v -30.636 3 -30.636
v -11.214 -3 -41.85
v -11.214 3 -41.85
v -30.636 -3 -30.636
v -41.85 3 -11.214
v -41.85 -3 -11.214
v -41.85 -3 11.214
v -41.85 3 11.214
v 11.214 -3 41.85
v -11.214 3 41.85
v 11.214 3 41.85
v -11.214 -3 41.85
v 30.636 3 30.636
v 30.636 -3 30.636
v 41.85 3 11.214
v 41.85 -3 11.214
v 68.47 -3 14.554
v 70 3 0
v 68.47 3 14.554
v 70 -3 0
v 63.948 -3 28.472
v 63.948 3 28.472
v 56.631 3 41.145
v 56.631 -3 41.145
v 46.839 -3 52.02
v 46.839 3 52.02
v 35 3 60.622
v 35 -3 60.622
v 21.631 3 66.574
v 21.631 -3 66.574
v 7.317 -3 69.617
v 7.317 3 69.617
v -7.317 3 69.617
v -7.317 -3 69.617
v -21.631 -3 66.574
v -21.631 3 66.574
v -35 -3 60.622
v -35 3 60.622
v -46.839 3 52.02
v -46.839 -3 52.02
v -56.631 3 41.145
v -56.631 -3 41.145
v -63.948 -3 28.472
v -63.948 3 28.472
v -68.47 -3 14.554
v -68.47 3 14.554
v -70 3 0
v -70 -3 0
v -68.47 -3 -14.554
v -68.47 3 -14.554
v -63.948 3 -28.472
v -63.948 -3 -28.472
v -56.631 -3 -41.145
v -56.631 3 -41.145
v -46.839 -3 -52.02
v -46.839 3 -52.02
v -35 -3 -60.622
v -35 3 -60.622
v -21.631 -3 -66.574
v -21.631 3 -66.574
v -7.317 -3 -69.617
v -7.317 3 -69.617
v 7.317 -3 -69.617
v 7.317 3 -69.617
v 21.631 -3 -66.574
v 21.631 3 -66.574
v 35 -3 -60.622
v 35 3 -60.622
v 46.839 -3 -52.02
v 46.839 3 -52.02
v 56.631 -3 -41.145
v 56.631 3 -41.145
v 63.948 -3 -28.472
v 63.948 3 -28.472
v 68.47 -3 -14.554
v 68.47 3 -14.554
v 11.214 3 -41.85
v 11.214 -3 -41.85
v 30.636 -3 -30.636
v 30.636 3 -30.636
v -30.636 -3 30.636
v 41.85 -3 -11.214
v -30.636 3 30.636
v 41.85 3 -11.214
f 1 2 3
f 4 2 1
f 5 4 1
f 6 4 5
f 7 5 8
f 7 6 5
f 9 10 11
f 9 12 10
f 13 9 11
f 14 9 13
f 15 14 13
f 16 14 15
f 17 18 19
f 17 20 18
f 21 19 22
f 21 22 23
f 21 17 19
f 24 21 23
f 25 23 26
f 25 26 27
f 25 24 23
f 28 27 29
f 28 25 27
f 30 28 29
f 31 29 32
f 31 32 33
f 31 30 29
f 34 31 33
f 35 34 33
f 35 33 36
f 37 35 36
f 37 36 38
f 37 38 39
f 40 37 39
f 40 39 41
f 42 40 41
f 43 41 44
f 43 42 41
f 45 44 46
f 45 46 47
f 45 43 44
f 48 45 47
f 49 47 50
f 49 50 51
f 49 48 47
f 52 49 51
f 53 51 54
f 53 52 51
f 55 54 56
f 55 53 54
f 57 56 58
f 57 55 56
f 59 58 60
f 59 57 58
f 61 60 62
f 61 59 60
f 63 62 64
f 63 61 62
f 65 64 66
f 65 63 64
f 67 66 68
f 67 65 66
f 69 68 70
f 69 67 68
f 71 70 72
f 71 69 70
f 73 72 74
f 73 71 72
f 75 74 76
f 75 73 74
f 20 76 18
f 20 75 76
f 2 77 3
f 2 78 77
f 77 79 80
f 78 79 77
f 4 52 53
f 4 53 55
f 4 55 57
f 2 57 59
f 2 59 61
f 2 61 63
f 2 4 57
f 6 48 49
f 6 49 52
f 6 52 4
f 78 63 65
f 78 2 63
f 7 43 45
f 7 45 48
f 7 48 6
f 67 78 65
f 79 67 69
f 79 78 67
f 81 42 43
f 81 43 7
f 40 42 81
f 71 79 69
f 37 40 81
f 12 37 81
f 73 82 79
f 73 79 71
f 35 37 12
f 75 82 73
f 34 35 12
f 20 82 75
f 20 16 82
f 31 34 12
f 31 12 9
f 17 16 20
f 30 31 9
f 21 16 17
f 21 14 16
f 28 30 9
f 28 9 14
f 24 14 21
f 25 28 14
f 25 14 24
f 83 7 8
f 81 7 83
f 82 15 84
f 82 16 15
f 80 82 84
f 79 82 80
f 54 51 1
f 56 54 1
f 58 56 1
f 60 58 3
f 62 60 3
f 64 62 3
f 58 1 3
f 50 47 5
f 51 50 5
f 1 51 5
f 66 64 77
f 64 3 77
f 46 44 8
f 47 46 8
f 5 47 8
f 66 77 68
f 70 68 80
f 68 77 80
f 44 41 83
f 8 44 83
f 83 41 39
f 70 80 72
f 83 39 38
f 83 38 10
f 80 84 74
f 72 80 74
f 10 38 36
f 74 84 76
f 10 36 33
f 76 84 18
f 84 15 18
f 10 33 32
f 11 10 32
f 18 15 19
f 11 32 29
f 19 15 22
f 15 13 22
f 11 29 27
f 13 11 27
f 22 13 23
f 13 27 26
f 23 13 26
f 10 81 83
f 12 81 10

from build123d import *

# Parameters (mm, degrees)
F0_R     = 70
F1_DEPTH = 3


# Not quite as in the source:
# - a feature of the source that left no trace in its solid (it failed there, or was rolled back) is left out


with BuildPart() as f1:
    # F0 (on Front) → F1 (new body, symmetric)
    with BuildSketch(Plane.XZ):
        Circle(F0_R)
        Polygon((-30.6363262968, 30.6363262968), (-11.2136737032, 41.85), (11.2136737032, 41.85), (30.6363262968, 30.6363262968), (41.85, 11.2136737032), (41.85, -11.2136737032), (30.6363262968, -30.6363262968), (11.2136737032, -41.85), (-11.2136737032, -41.85), (-30.6363262968, -30.6363262968), (-41.85, -11.2136737032), (-41.85, 11.2136737032), align=None, mode=Mode.SUBTRACT)
    extrude(amount=F1_DEPTH, both=True)


solid = f1.part
